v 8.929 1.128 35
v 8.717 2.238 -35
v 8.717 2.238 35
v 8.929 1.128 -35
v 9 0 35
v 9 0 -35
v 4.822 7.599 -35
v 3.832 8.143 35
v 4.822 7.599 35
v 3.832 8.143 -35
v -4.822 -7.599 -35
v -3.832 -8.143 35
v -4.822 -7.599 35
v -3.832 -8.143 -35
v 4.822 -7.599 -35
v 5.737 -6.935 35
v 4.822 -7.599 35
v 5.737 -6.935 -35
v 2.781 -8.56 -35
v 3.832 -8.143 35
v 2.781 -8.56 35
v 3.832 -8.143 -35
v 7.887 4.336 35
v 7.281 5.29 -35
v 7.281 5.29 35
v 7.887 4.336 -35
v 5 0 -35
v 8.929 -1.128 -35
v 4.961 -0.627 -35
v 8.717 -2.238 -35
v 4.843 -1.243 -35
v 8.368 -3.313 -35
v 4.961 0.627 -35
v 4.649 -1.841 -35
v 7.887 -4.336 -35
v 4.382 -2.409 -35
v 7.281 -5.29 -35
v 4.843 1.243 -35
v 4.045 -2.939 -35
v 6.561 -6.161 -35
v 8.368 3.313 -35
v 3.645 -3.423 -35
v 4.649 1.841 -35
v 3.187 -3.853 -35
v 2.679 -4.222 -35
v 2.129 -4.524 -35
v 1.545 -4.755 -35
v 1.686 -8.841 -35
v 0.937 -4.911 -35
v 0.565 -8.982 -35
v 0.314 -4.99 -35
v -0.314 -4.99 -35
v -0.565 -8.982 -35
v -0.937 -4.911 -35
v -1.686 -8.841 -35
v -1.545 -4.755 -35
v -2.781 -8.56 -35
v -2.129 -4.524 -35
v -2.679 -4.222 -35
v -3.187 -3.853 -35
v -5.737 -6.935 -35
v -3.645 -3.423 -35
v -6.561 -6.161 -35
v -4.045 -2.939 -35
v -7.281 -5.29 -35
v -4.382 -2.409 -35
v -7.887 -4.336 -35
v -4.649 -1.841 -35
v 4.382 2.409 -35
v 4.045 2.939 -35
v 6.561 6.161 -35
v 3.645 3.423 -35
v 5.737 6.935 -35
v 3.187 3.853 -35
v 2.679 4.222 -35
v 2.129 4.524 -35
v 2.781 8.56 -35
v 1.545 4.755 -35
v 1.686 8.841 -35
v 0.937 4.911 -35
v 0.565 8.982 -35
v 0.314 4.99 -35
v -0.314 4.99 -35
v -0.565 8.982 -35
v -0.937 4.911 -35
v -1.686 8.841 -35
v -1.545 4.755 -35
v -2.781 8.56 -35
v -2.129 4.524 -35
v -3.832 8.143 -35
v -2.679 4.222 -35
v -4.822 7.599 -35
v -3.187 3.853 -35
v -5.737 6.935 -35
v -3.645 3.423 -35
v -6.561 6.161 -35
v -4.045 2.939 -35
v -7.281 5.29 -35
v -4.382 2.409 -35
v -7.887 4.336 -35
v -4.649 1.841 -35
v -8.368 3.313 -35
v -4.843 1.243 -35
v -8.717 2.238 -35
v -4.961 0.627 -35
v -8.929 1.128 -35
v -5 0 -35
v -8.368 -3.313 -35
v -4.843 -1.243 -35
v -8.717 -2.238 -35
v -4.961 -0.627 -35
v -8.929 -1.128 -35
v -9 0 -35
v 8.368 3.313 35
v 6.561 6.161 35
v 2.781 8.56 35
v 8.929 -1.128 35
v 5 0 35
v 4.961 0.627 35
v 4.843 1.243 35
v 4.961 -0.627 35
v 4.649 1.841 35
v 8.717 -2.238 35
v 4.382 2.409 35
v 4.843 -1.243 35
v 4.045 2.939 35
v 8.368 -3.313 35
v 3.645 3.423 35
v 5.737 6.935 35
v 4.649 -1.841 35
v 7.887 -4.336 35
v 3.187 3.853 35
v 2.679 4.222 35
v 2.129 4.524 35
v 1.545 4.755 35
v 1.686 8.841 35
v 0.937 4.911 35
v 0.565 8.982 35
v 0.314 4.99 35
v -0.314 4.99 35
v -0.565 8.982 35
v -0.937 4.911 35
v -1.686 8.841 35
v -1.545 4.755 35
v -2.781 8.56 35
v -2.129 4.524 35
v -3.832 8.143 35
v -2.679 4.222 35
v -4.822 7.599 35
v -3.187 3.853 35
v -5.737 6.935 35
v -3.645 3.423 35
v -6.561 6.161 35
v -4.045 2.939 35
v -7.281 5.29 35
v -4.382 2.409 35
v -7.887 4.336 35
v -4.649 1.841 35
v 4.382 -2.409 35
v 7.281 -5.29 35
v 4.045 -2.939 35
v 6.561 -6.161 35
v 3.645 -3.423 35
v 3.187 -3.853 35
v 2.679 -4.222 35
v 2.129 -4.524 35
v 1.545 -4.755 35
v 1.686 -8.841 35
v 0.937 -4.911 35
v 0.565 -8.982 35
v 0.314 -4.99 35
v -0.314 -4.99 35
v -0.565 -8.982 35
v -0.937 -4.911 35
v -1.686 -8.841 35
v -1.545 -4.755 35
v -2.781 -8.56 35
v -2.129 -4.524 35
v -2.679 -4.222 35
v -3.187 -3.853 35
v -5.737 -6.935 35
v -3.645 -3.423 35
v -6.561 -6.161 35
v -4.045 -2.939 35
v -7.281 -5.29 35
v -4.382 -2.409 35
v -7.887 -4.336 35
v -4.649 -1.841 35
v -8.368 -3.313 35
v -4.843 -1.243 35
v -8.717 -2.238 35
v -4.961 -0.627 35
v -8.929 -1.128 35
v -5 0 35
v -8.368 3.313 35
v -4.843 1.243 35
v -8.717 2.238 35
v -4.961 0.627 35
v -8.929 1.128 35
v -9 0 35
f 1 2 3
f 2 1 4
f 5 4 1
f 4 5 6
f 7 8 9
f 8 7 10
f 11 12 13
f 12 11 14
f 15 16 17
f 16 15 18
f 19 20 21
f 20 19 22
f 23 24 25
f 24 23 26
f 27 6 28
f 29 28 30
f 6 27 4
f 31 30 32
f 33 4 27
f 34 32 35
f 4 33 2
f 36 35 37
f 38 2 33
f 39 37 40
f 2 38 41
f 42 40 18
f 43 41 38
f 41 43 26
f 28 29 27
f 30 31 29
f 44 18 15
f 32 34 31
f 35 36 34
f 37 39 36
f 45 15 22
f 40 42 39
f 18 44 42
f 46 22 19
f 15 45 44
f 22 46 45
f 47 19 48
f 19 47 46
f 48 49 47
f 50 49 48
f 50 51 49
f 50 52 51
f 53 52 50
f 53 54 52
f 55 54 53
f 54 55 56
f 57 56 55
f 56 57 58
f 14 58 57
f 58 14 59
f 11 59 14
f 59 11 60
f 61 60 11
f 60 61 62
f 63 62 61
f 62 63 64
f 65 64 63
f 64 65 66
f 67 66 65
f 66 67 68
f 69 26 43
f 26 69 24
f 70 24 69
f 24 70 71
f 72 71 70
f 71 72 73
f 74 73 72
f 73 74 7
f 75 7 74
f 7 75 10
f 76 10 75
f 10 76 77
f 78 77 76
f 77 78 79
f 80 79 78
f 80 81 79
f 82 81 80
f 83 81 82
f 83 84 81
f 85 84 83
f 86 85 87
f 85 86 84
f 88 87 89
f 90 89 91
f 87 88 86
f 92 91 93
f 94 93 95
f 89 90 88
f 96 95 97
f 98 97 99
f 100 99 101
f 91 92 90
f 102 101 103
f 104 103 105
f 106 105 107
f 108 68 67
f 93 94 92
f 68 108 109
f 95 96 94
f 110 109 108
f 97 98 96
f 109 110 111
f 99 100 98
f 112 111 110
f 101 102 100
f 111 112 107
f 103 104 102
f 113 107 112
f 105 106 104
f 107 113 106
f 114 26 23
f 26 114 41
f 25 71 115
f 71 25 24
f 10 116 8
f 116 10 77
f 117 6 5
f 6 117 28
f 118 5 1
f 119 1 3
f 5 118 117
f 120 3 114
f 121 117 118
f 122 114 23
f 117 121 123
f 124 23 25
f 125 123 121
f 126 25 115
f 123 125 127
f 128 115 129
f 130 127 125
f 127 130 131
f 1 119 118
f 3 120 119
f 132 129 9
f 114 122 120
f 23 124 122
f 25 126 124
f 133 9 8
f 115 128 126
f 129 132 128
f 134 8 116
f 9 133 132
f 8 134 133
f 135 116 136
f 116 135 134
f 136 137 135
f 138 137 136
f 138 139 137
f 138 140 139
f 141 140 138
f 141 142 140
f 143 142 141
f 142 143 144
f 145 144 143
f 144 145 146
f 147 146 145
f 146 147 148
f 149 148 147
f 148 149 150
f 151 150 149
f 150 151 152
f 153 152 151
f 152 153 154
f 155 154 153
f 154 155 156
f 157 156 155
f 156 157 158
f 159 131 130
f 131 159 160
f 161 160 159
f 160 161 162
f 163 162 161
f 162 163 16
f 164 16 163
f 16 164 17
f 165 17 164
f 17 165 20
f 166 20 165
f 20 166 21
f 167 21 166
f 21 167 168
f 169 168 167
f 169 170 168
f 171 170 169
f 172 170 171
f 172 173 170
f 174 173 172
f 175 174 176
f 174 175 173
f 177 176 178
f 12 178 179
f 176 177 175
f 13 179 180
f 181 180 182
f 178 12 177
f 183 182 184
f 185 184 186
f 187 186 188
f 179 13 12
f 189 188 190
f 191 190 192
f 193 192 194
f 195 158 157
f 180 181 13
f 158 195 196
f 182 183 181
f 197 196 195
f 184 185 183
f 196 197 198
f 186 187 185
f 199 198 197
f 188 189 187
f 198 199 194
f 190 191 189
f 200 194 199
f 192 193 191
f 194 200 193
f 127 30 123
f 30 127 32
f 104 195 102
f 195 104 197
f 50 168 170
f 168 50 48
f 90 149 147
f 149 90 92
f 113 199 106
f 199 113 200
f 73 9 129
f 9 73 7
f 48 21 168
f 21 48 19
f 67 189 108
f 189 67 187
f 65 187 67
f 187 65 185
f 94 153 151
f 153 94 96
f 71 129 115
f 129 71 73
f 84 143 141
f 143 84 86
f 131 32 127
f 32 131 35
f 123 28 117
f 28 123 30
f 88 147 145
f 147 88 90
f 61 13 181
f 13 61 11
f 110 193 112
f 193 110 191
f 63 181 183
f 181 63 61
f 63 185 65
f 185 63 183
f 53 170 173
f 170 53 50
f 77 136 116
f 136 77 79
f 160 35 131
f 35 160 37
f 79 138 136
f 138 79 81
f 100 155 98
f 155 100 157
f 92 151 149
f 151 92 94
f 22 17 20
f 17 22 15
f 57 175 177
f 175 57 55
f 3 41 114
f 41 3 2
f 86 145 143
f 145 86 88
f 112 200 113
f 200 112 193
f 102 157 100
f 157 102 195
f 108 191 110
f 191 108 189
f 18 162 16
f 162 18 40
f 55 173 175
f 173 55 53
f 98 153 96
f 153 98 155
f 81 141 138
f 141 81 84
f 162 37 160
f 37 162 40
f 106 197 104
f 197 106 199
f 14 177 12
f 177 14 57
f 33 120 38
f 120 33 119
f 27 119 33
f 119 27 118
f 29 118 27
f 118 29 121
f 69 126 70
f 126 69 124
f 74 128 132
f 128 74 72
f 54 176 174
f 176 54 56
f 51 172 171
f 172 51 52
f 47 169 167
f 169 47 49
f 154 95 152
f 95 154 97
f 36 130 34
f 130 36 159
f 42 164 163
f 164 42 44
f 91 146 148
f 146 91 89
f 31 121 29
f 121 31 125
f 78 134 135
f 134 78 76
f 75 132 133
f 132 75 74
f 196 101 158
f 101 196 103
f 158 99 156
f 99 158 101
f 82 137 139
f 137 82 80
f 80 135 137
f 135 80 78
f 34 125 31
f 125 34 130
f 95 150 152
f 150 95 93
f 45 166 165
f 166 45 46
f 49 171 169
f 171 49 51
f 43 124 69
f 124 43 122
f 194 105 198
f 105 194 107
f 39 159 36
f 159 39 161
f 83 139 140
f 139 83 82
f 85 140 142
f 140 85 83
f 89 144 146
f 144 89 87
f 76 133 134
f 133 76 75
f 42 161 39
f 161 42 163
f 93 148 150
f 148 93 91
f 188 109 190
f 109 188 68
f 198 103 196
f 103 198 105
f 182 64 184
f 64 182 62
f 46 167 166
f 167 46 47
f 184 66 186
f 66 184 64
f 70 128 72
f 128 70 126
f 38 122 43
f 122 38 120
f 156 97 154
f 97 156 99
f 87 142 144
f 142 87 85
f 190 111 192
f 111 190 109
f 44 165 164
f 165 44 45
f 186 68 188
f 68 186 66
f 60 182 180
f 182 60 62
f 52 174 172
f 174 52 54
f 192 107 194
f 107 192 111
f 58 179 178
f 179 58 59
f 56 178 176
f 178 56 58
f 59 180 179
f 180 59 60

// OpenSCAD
$fn = 50;


difference() {
	union() {
		translate(v = [0, 0, -35.0000000000]) {
			cylinder(h = 70, r = 9.0000000000);
		}
	}
	union() {
		translate(v = [0, 0, -100.0000000000]) {
			cylinder(h = 200, r = 5.0000000000);
		}
	}
}
